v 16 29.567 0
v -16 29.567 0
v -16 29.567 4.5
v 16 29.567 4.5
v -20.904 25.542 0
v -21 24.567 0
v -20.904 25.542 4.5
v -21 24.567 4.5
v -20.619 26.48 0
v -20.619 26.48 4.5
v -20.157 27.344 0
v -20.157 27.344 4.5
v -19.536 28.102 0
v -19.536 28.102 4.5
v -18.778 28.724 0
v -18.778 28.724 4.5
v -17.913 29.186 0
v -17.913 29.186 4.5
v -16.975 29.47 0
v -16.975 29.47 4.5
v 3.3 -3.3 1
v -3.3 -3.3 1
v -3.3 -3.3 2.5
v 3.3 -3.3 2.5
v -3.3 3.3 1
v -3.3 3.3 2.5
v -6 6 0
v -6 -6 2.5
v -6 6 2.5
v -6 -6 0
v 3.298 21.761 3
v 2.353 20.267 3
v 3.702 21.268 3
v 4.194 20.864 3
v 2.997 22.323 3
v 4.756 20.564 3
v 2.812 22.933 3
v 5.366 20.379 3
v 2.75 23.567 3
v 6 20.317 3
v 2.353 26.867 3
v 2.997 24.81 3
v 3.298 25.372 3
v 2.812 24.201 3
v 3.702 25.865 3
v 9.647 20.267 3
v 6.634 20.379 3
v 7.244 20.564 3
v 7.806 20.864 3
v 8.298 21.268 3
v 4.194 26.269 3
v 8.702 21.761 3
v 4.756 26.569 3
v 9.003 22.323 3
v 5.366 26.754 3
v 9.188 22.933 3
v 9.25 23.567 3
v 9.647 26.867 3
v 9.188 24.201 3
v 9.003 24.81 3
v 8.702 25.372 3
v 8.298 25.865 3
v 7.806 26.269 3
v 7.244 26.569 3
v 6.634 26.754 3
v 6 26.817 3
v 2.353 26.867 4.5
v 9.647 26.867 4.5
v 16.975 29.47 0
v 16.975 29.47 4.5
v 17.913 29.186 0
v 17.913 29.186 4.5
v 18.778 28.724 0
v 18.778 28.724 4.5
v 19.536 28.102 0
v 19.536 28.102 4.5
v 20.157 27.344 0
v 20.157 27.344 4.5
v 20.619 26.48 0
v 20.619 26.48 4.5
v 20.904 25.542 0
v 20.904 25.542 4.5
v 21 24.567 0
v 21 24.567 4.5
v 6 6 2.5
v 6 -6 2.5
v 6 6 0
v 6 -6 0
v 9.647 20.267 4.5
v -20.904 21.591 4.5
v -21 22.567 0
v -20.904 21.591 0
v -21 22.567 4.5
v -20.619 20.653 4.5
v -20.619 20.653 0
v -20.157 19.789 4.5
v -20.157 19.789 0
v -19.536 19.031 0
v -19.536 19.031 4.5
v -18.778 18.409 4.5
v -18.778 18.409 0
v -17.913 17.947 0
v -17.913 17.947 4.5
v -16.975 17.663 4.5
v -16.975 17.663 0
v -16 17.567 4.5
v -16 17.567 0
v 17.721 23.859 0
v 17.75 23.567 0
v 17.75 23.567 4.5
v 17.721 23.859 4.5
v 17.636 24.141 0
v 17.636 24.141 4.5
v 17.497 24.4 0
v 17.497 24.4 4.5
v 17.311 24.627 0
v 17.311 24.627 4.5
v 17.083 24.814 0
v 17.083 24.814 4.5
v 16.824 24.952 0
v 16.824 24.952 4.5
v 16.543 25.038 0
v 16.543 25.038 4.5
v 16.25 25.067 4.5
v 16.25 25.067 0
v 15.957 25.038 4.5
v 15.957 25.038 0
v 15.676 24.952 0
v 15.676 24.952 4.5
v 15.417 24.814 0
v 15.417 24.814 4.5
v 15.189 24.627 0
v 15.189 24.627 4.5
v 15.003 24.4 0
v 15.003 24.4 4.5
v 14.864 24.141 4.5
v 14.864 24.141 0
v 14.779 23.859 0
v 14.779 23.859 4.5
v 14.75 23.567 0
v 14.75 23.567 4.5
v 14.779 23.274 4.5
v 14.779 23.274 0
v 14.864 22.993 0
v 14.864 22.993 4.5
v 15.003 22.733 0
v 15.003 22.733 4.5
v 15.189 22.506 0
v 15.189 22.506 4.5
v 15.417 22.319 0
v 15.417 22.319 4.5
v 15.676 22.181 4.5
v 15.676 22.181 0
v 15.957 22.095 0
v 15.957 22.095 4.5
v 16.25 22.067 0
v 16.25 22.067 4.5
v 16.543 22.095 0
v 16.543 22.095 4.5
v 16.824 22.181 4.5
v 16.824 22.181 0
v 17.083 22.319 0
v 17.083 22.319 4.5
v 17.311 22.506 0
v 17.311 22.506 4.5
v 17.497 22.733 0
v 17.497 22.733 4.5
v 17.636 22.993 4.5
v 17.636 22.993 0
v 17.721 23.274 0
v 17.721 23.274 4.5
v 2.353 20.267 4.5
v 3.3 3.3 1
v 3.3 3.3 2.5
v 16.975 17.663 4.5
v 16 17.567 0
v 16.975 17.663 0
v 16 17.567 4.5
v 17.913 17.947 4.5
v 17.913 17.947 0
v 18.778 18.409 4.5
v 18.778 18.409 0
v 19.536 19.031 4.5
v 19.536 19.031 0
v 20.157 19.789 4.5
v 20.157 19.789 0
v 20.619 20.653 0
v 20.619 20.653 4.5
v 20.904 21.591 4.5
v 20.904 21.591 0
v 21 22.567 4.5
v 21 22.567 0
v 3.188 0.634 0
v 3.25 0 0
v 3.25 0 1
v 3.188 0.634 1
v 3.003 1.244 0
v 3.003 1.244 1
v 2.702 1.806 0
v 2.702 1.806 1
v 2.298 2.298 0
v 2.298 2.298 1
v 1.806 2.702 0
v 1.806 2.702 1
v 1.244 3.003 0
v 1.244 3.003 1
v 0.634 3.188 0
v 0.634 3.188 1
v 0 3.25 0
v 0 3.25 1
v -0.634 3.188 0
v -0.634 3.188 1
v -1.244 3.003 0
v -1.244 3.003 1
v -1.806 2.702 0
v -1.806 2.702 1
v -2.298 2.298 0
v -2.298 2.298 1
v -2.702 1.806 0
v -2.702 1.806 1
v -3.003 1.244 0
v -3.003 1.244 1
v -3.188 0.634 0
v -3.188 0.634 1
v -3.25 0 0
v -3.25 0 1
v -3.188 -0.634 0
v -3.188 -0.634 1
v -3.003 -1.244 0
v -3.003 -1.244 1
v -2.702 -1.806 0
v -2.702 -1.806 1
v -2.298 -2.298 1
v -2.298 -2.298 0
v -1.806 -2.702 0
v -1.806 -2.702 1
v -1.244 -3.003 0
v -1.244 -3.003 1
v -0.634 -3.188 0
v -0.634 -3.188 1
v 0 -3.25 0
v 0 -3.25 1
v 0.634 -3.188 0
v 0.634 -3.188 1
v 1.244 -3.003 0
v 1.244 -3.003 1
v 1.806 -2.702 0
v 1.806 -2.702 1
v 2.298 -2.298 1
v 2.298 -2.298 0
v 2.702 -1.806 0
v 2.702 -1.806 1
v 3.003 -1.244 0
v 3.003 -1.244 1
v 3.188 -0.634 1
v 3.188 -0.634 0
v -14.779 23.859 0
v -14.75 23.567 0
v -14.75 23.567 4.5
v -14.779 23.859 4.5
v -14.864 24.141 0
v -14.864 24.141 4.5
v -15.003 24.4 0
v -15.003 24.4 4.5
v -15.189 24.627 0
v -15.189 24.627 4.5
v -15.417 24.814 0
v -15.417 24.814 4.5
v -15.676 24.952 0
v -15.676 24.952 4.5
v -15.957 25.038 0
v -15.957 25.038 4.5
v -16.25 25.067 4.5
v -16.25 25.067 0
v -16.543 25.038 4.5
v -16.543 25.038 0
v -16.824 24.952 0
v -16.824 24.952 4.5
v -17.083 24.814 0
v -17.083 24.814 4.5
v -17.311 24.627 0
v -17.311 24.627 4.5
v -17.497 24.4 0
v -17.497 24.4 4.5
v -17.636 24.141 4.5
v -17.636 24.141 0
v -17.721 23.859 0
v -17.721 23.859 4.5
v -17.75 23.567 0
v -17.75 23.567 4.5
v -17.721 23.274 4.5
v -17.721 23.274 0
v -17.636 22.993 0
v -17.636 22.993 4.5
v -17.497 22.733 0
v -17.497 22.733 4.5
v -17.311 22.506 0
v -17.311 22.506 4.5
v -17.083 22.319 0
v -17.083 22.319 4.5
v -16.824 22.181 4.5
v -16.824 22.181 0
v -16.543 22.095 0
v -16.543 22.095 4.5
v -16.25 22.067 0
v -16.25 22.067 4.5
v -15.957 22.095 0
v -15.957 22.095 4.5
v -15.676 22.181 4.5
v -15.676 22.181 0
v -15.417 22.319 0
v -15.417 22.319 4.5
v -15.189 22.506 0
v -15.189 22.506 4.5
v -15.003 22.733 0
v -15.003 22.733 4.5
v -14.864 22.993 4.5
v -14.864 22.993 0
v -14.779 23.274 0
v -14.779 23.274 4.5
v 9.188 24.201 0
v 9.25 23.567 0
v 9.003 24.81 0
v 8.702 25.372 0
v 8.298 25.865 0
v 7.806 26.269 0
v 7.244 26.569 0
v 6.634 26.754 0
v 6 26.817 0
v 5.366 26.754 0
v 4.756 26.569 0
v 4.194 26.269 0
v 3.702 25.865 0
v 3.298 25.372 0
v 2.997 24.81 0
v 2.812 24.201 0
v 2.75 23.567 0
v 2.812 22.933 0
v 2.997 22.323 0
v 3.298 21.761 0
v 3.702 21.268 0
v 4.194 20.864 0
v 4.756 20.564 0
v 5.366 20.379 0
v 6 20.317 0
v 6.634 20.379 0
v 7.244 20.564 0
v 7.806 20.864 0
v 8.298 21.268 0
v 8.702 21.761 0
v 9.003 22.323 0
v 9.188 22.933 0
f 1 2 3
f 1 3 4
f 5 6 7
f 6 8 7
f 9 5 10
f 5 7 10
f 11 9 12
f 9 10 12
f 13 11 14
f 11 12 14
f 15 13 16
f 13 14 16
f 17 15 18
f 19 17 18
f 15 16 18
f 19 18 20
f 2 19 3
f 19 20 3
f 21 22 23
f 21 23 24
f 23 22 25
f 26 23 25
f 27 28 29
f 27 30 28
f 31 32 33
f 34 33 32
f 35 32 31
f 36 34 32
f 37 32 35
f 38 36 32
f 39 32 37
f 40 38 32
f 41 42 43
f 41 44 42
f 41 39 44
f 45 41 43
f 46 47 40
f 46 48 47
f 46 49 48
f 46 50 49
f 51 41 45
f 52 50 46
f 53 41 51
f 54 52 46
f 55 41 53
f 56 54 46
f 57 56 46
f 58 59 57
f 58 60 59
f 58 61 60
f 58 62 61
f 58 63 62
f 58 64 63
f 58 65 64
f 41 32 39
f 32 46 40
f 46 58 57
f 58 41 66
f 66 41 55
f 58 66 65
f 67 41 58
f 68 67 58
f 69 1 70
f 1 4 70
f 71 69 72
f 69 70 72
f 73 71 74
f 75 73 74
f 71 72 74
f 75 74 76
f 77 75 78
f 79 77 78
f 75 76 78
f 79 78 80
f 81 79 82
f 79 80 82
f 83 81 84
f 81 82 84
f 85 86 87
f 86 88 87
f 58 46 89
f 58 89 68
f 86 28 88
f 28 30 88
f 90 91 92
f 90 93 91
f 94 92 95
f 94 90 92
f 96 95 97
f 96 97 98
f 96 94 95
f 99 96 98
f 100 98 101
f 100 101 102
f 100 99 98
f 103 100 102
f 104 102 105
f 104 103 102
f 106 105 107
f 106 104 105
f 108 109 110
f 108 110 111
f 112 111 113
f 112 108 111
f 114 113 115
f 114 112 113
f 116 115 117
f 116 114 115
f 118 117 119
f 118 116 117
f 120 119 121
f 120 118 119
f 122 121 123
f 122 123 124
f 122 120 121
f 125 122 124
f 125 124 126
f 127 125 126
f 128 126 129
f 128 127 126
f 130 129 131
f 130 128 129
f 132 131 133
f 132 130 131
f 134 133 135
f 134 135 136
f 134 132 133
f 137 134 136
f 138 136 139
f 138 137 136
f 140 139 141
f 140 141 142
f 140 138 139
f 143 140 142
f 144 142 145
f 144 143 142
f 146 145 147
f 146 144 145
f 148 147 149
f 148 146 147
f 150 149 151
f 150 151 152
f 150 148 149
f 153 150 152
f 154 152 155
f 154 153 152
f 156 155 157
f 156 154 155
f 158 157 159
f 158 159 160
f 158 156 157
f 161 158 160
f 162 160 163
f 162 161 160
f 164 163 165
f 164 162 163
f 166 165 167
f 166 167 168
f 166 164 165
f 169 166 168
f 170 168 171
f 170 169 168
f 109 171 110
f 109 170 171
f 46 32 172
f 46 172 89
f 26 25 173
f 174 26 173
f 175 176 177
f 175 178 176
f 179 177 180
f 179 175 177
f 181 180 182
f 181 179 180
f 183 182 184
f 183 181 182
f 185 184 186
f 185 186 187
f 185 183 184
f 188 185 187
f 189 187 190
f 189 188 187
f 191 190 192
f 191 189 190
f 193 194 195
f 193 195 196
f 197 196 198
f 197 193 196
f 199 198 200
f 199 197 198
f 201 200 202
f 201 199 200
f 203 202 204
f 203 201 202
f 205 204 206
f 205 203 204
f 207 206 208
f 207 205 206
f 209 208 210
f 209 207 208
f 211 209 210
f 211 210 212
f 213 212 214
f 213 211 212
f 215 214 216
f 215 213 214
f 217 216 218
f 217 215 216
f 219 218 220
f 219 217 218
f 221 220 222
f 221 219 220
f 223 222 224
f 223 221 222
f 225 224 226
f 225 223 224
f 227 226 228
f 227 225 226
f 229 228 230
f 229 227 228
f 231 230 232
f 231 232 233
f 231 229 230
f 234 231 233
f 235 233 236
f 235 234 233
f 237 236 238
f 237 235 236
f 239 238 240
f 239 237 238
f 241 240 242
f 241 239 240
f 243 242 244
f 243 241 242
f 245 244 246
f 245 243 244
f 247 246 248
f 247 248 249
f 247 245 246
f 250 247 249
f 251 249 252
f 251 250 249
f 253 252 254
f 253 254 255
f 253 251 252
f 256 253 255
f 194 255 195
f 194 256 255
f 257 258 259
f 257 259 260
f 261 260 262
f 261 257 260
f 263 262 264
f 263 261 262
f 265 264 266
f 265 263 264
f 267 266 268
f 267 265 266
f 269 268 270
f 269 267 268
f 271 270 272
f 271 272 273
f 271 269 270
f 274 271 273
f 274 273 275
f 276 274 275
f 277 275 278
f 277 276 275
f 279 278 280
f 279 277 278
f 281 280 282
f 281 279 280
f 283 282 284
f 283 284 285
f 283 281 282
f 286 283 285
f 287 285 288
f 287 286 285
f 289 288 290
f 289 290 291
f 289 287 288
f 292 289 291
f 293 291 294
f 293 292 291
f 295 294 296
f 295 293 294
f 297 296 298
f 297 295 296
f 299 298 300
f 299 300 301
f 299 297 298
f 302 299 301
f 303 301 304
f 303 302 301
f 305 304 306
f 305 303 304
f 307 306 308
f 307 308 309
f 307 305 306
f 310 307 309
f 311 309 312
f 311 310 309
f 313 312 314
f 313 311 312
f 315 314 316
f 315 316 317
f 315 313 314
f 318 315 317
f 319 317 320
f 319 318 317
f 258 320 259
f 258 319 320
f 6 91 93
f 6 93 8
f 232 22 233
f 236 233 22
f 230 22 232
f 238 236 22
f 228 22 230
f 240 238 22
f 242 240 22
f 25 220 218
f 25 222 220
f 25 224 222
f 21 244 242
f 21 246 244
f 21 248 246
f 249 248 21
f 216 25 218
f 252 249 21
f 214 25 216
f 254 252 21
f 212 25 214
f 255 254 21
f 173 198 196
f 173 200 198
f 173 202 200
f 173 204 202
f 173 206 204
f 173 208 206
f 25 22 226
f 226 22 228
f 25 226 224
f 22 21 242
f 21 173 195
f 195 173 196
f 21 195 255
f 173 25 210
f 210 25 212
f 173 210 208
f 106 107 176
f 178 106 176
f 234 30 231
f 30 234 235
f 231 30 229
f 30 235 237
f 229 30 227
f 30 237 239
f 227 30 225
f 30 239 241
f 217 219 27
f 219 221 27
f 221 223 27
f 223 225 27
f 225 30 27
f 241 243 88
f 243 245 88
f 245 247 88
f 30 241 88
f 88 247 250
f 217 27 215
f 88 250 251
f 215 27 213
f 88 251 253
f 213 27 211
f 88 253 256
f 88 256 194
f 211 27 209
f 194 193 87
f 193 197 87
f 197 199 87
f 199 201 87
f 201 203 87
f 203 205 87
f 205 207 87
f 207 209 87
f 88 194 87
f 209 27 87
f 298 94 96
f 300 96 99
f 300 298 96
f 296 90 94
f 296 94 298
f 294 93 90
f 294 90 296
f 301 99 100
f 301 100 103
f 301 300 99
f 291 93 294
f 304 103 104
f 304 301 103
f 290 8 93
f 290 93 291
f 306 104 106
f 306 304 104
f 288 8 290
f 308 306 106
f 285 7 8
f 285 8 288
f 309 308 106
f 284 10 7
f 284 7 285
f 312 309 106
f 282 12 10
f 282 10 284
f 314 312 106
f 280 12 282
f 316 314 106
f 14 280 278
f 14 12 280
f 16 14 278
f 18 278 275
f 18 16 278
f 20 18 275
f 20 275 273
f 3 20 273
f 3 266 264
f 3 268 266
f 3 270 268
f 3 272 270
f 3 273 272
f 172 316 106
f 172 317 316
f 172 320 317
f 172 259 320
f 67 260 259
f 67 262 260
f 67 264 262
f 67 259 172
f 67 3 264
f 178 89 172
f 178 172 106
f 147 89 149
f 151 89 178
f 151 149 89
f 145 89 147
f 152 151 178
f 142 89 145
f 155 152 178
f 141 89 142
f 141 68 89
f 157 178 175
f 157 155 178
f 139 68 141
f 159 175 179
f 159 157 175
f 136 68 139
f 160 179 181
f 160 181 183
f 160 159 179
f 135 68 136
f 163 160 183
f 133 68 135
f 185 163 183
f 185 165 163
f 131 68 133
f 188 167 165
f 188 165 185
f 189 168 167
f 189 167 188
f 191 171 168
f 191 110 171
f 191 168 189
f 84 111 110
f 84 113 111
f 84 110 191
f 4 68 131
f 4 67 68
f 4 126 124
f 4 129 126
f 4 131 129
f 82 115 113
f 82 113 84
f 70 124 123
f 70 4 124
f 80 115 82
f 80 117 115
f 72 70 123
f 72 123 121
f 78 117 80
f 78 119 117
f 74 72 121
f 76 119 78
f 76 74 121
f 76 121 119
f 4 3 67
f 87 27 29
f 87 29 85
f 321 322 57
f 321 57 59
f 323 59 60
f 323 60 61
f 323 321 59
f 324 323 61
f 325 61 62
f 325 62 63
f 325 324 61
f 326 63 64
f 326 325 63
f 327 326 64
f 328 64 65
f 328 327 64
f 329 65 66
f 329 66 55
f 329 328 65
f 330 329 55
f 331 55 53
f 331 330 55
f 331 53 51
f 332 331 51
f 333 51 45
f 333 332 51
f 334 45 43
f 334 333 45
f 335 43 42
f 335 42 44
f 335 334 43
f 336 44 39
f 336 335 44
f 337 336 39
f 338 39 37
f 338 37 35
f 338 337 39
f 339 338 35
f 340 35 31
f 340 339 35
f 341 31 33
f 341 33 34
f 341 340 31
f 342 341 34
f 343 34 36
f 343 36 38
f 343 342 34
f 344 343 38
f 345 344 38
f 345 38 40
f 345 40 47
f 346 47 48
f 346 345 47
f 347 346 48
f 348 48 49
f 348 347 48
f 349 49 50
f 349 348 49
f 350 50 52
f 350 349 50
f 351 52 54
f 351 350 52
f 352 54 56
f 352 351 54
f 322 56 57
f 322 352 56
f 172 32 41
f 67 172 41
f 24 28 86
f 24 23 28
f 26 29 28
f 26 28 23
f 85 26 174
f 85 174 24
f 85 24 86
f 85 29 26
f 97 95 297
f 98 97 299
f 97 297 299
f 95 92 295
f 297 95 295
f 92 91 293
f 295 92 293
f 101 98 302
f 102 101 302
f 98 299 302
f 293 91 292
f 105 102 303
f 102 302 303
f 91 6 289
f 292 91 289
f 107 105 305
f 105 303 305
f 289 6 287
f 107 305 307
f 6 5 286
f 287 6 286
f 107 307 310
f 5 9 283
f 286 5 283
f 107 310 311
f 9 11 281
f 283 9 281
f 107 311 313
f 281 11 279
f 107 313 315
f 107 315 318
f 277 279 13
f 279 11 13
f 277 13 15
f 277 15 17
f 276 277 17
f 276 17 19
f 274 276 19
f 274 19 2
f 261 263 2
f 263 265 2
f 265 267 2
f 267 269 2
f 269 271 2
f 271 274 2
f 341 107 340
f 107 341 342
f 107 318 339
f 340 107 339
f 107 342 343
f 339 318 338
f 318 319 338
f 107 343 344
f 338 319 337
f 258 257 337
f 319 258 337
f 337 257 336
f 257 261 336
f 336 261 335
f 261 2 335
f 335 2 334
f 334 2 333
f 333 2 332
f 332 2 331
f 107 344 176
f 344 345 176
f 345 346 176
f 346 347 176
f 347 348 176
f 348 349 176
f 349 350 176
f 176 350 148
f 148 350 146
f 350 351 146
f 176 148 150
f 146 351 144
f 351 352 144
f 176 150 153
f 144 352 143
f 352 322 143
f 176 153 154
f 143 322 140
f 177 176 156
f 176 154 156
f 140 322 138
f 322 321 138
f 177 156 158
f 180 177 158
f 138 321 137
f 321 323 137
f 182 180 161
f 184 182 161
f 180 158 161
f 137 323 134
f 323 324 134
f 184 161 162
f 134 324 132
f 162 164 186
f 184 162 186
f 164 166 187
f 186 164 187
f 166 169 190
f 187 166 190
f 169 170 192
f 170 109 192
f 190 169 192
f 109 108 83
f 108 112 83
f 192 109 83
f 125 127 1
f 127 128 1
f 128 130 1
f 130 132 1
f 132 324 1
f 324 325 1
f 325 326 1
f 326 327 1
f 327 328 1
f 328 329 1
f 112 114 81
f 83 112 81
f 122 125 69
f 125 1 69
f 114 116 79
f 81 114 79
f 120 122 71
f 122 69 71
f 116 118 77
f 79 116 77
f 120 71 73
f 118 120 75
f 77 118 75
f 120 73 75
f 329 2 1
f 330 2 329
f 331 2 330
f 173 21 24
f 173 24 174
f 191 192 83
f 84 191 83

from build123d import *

# Parameters (mm, degrees)
F3_W     = 12
F3_H     = 12
F3_R     = 3.25
F4_DEPTH = 1
F5_W     = 12
F5_H     = 12
F5_W_2   = 6.6
F5_H_2   = 6.6
F6_DEPTH = 1.5
F7_W     = 42
F7_H     = 12
F7_R     = 1.5
F7_W_2   = 7.2937997878
F7_H_2   = 6.6
F8_DEPTH = 4.5
F7_R_2   = 3.25
F9_DEPTH = 3
F10_R    = 5


with BuildPart() as f4:
    # F3 (on Top) → F4 (new body)
    with BuildSketch(Plane.XY):
        Rectangle(F3_W, F3_H)
        Circle(F3_R, mode=Mode.SUBTRACT)
    extrude(amount=F4_DEPTH)

    # F5 (on face) → F6 (join)
    with BuildSketch(Plane.XY.offset(1)):
        Rectangle(F5_W, F5_H)
        Rectangle(F5_W_2, F5_H_2, mode=Mode.SUBTRACT)
    extrude(amount=F6_DEPTH)


with BuildPart() as f8:
    # F7 (on Top) → F8 (new body)
    with BuildSketch(Plane.XY):
        with Locations((0, 23.5665622275)):
            Rectangle(F7_W, F7_H)
        with Locations((-16.25, 23.5665622275)):
            Circle(F7_R, mode=Mode.SUBTRACT)
        with Locations((6, 23.5665622275)):
            Rectangle(F7_W_2, F7_H_2, mode=Mode.SUBTRACT)
        with Locations((16.25, 23.5665622275)):
            Circle(F7_R, mode=Mode.SUBTRACT)
    extrude(amount=F8_DEPTH)

    # F7 (on Top) → F9 (join)
    with BuildSketch(Plane.XY):
        with Locations((6, 23.5665622275)):
            Rectangle(F7_W_2, F7_H_2)
        with Locations((6, 23.5665622275)):
            Circle(F7_R_2, mode=Mode.SUBTRACT)
    extrude(amount=F9_DEPTH)

    # F10
    f10_edges = [f8.edges().sort_by_distance(p)[0] for p in [
        (21, 17.566562, 2.25),
        (-21, 17.566562, 2.25),
        (21, 29.566562, 2.25),
        (-21, 29.566562, 2.25),
    ]]
    fillet(f10_edges, radius=F10_R)


solid = Compound([f4.part, f8.part])
